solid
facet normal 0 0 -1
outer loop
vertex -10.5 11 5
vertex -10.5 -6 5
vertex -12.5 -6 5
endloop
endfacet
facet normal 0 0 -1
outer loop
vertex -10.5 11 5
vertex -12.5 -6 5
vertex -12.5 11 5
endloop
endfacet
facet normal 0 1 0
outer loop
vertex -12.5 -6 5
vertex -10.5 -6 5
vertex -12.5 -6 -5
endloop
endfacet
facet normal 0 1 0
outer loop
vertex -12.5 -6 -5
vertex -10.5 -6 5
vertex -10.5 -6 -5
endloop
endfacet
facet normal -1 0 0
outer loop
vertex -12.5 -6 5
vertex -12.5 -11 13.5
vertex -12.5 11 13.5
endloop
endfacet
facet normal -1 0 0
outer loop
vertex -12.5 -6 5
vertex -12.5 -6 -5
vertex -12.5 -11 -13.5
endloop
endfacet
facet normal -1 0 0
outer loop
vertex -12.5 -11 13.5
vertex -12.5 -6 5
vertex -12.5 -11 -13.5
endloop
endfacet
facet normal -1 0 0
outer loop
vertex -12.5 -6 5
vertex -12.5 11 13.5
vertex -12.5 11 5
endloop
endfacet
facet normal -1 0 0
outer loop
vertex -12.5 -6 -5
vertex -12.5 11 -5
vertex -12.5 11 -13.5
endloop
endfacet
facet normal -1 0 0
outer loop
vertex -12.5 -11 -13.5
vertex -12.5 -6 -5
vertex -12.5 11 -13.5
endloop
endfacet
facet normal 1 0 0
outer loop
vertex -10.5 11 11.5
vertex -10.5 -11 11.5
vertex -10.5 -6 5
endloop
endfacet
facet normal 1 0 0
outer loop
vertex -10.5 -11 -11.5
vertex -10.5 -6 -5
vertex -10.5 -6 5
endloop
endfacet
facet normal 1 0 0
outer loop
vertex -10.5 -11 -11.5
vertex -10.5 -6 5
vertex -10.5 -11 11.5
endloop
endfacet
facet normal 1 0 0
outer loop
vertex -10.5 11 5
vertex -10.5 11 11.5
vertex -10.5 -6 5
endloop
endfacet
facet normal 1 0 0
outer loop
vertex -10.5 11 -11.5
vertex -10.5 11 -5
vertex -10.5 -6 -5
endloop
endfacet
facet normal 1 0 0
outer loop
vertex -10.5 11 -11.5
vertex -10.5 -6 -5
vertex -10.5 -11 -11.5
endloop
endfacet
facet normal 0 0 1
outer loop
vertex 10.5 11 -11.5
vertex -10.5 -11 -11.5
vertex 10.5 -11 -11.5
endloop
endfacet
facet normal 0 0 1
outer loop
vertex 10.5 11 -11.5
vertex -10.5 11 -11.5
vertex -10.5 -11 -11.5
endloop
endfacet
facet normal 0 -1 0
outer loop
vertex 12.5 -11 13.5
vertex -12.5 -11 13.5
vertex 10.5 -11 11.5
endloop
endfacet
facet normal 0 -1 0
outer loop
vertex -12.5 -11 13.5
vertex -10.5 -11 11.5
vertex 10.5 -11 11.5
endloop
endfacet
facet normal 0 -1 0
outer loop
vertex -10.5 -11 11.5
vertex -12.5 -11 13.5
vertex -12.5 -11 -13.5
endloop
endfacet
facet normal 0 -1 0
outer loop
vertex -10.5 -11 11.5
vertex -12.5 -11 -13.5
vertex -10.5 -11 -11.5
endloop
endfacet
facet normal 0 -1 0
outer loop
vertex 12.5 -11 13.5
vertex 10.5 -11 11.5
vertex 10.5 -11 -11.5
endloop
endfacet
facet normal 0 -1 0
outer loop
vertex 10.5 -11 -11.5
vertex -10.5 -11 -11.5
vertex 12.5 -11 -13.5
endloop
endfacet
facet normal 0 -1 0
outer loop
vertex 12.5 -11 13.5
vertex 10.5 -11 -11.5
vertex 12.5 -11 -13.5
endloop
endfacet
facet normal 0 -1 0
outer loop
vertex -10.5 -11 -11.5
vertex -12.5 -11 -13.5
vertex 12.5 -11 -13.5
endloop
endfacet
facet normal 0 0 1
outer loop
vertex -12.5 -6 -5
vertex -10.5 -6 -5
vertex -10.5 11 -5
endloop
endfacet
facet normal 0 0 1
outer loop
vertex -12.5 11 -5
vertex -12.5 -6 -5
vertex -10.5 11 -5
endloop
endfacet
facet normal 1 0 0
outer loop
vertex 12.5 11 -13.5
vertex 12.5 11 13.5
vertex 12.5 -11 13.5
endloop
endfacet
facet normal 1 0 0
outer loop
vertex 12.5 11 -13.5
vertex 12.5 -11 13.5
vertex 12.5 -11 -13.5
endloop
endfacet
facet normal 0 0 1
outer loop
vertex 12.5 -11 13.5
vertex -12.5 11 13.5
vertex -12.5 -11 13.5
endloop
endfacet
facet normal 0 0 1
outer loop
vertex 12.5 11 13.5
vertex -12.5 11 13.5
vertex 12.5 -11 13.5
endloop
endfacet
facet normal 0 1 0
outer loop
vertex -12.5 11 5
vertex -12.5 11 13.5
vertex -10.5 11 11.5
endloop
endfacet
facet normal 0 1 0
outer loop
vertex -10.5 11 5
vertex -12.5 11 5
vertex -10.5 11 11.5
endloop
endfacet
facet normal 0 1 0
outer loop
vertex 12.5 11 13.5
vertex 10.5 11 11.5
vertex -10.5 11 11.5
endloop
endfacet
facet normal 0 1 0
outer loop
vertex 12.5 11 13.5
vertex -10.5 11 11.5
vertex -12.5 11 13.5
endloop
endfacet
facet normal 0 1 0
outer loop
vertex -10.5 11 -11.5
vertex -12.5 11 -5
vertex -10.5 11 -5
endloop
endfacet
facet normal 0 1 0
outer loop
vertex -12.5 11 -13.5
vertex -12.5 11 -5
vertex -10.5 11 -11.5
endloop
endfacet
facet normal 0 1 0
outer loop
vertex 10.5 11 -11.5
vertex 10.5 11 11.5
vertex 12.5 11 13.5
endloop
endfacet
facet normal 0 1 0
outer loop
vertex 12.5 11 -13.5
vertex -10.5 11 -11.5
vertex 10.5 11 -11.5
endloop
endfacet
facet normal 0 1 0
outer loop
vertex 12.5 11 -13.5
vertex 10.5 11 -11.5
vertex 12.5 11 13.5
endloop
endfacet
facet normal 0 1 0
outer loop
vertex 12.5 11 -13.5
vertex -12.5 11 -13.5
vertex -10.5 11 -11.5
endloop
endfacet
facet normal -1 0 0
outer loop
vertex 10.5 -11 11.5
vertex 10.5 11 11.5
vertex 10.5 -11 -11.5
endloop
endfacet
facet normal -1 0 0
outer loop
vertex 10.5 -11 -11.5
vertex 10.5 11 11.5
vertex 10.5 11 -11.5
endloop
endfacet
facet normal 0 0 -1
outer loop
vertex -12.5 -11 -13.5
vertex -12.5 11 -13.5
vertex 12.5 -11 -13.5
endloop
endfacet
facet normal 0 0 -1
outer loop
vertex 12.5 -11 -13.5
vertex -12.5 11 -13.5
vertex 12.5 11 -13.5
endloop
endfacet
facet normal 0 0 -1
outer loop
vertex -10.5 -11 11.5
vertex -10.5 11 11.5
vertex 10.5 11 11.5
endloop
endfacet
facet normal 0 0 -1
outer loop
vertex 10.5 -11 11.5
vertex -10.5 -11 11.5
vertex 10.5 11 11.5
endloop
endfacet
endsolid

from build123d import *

# Parameters (mm, degrees)
SKETCH1_W           = 25
SKETCH1_H           = 27
SKETCH1_W_2         = 21
SKETCH1_H_2         = 23
BOSS_EXTRUDE1_DEPTH = 11
CUT_EXTRUDE1_START  = -10.5
SKETCH2_W           = 10
SKETCH2_H           = 17
CUT_EXTRUDE1_DEPTH  = 3


with BuildPart() as part:
    # Sketch1 → Boss-Extrude1 (new body, symmetric)
    with BuildSketch(Plane(origin=(0, 0, 0), x_dir=(1, 0, 0), z_dir=(0, 1, 0))):
        Rectangle(SKETCH1_W, SKETCH1_H)
        Rectangle(SKETCH1_W_2, SKETCH1_H_2, mode=Mode.SUBTRACT)
    extrude(amount=BOSS_EXTRUDE1_DEPTH, both=True)

    # Sketch2 → Cut-Extrude1 (cut)
    with BuildSketch(Plane(origin=(0, 0, 0), x_dir=(0, 0, -1), z_dir=(1, 0, 0)).offset(CUT_EXTRUDE1_START)):
        with Locations((0, 2.5)):
            Rectangle(SKETCH2_W, SKETCH2_H)
    extrude(amount=-CUT_EXTRUDE1_DEPTH, mode=Mode.SUBTRACT)


solid = part.part
